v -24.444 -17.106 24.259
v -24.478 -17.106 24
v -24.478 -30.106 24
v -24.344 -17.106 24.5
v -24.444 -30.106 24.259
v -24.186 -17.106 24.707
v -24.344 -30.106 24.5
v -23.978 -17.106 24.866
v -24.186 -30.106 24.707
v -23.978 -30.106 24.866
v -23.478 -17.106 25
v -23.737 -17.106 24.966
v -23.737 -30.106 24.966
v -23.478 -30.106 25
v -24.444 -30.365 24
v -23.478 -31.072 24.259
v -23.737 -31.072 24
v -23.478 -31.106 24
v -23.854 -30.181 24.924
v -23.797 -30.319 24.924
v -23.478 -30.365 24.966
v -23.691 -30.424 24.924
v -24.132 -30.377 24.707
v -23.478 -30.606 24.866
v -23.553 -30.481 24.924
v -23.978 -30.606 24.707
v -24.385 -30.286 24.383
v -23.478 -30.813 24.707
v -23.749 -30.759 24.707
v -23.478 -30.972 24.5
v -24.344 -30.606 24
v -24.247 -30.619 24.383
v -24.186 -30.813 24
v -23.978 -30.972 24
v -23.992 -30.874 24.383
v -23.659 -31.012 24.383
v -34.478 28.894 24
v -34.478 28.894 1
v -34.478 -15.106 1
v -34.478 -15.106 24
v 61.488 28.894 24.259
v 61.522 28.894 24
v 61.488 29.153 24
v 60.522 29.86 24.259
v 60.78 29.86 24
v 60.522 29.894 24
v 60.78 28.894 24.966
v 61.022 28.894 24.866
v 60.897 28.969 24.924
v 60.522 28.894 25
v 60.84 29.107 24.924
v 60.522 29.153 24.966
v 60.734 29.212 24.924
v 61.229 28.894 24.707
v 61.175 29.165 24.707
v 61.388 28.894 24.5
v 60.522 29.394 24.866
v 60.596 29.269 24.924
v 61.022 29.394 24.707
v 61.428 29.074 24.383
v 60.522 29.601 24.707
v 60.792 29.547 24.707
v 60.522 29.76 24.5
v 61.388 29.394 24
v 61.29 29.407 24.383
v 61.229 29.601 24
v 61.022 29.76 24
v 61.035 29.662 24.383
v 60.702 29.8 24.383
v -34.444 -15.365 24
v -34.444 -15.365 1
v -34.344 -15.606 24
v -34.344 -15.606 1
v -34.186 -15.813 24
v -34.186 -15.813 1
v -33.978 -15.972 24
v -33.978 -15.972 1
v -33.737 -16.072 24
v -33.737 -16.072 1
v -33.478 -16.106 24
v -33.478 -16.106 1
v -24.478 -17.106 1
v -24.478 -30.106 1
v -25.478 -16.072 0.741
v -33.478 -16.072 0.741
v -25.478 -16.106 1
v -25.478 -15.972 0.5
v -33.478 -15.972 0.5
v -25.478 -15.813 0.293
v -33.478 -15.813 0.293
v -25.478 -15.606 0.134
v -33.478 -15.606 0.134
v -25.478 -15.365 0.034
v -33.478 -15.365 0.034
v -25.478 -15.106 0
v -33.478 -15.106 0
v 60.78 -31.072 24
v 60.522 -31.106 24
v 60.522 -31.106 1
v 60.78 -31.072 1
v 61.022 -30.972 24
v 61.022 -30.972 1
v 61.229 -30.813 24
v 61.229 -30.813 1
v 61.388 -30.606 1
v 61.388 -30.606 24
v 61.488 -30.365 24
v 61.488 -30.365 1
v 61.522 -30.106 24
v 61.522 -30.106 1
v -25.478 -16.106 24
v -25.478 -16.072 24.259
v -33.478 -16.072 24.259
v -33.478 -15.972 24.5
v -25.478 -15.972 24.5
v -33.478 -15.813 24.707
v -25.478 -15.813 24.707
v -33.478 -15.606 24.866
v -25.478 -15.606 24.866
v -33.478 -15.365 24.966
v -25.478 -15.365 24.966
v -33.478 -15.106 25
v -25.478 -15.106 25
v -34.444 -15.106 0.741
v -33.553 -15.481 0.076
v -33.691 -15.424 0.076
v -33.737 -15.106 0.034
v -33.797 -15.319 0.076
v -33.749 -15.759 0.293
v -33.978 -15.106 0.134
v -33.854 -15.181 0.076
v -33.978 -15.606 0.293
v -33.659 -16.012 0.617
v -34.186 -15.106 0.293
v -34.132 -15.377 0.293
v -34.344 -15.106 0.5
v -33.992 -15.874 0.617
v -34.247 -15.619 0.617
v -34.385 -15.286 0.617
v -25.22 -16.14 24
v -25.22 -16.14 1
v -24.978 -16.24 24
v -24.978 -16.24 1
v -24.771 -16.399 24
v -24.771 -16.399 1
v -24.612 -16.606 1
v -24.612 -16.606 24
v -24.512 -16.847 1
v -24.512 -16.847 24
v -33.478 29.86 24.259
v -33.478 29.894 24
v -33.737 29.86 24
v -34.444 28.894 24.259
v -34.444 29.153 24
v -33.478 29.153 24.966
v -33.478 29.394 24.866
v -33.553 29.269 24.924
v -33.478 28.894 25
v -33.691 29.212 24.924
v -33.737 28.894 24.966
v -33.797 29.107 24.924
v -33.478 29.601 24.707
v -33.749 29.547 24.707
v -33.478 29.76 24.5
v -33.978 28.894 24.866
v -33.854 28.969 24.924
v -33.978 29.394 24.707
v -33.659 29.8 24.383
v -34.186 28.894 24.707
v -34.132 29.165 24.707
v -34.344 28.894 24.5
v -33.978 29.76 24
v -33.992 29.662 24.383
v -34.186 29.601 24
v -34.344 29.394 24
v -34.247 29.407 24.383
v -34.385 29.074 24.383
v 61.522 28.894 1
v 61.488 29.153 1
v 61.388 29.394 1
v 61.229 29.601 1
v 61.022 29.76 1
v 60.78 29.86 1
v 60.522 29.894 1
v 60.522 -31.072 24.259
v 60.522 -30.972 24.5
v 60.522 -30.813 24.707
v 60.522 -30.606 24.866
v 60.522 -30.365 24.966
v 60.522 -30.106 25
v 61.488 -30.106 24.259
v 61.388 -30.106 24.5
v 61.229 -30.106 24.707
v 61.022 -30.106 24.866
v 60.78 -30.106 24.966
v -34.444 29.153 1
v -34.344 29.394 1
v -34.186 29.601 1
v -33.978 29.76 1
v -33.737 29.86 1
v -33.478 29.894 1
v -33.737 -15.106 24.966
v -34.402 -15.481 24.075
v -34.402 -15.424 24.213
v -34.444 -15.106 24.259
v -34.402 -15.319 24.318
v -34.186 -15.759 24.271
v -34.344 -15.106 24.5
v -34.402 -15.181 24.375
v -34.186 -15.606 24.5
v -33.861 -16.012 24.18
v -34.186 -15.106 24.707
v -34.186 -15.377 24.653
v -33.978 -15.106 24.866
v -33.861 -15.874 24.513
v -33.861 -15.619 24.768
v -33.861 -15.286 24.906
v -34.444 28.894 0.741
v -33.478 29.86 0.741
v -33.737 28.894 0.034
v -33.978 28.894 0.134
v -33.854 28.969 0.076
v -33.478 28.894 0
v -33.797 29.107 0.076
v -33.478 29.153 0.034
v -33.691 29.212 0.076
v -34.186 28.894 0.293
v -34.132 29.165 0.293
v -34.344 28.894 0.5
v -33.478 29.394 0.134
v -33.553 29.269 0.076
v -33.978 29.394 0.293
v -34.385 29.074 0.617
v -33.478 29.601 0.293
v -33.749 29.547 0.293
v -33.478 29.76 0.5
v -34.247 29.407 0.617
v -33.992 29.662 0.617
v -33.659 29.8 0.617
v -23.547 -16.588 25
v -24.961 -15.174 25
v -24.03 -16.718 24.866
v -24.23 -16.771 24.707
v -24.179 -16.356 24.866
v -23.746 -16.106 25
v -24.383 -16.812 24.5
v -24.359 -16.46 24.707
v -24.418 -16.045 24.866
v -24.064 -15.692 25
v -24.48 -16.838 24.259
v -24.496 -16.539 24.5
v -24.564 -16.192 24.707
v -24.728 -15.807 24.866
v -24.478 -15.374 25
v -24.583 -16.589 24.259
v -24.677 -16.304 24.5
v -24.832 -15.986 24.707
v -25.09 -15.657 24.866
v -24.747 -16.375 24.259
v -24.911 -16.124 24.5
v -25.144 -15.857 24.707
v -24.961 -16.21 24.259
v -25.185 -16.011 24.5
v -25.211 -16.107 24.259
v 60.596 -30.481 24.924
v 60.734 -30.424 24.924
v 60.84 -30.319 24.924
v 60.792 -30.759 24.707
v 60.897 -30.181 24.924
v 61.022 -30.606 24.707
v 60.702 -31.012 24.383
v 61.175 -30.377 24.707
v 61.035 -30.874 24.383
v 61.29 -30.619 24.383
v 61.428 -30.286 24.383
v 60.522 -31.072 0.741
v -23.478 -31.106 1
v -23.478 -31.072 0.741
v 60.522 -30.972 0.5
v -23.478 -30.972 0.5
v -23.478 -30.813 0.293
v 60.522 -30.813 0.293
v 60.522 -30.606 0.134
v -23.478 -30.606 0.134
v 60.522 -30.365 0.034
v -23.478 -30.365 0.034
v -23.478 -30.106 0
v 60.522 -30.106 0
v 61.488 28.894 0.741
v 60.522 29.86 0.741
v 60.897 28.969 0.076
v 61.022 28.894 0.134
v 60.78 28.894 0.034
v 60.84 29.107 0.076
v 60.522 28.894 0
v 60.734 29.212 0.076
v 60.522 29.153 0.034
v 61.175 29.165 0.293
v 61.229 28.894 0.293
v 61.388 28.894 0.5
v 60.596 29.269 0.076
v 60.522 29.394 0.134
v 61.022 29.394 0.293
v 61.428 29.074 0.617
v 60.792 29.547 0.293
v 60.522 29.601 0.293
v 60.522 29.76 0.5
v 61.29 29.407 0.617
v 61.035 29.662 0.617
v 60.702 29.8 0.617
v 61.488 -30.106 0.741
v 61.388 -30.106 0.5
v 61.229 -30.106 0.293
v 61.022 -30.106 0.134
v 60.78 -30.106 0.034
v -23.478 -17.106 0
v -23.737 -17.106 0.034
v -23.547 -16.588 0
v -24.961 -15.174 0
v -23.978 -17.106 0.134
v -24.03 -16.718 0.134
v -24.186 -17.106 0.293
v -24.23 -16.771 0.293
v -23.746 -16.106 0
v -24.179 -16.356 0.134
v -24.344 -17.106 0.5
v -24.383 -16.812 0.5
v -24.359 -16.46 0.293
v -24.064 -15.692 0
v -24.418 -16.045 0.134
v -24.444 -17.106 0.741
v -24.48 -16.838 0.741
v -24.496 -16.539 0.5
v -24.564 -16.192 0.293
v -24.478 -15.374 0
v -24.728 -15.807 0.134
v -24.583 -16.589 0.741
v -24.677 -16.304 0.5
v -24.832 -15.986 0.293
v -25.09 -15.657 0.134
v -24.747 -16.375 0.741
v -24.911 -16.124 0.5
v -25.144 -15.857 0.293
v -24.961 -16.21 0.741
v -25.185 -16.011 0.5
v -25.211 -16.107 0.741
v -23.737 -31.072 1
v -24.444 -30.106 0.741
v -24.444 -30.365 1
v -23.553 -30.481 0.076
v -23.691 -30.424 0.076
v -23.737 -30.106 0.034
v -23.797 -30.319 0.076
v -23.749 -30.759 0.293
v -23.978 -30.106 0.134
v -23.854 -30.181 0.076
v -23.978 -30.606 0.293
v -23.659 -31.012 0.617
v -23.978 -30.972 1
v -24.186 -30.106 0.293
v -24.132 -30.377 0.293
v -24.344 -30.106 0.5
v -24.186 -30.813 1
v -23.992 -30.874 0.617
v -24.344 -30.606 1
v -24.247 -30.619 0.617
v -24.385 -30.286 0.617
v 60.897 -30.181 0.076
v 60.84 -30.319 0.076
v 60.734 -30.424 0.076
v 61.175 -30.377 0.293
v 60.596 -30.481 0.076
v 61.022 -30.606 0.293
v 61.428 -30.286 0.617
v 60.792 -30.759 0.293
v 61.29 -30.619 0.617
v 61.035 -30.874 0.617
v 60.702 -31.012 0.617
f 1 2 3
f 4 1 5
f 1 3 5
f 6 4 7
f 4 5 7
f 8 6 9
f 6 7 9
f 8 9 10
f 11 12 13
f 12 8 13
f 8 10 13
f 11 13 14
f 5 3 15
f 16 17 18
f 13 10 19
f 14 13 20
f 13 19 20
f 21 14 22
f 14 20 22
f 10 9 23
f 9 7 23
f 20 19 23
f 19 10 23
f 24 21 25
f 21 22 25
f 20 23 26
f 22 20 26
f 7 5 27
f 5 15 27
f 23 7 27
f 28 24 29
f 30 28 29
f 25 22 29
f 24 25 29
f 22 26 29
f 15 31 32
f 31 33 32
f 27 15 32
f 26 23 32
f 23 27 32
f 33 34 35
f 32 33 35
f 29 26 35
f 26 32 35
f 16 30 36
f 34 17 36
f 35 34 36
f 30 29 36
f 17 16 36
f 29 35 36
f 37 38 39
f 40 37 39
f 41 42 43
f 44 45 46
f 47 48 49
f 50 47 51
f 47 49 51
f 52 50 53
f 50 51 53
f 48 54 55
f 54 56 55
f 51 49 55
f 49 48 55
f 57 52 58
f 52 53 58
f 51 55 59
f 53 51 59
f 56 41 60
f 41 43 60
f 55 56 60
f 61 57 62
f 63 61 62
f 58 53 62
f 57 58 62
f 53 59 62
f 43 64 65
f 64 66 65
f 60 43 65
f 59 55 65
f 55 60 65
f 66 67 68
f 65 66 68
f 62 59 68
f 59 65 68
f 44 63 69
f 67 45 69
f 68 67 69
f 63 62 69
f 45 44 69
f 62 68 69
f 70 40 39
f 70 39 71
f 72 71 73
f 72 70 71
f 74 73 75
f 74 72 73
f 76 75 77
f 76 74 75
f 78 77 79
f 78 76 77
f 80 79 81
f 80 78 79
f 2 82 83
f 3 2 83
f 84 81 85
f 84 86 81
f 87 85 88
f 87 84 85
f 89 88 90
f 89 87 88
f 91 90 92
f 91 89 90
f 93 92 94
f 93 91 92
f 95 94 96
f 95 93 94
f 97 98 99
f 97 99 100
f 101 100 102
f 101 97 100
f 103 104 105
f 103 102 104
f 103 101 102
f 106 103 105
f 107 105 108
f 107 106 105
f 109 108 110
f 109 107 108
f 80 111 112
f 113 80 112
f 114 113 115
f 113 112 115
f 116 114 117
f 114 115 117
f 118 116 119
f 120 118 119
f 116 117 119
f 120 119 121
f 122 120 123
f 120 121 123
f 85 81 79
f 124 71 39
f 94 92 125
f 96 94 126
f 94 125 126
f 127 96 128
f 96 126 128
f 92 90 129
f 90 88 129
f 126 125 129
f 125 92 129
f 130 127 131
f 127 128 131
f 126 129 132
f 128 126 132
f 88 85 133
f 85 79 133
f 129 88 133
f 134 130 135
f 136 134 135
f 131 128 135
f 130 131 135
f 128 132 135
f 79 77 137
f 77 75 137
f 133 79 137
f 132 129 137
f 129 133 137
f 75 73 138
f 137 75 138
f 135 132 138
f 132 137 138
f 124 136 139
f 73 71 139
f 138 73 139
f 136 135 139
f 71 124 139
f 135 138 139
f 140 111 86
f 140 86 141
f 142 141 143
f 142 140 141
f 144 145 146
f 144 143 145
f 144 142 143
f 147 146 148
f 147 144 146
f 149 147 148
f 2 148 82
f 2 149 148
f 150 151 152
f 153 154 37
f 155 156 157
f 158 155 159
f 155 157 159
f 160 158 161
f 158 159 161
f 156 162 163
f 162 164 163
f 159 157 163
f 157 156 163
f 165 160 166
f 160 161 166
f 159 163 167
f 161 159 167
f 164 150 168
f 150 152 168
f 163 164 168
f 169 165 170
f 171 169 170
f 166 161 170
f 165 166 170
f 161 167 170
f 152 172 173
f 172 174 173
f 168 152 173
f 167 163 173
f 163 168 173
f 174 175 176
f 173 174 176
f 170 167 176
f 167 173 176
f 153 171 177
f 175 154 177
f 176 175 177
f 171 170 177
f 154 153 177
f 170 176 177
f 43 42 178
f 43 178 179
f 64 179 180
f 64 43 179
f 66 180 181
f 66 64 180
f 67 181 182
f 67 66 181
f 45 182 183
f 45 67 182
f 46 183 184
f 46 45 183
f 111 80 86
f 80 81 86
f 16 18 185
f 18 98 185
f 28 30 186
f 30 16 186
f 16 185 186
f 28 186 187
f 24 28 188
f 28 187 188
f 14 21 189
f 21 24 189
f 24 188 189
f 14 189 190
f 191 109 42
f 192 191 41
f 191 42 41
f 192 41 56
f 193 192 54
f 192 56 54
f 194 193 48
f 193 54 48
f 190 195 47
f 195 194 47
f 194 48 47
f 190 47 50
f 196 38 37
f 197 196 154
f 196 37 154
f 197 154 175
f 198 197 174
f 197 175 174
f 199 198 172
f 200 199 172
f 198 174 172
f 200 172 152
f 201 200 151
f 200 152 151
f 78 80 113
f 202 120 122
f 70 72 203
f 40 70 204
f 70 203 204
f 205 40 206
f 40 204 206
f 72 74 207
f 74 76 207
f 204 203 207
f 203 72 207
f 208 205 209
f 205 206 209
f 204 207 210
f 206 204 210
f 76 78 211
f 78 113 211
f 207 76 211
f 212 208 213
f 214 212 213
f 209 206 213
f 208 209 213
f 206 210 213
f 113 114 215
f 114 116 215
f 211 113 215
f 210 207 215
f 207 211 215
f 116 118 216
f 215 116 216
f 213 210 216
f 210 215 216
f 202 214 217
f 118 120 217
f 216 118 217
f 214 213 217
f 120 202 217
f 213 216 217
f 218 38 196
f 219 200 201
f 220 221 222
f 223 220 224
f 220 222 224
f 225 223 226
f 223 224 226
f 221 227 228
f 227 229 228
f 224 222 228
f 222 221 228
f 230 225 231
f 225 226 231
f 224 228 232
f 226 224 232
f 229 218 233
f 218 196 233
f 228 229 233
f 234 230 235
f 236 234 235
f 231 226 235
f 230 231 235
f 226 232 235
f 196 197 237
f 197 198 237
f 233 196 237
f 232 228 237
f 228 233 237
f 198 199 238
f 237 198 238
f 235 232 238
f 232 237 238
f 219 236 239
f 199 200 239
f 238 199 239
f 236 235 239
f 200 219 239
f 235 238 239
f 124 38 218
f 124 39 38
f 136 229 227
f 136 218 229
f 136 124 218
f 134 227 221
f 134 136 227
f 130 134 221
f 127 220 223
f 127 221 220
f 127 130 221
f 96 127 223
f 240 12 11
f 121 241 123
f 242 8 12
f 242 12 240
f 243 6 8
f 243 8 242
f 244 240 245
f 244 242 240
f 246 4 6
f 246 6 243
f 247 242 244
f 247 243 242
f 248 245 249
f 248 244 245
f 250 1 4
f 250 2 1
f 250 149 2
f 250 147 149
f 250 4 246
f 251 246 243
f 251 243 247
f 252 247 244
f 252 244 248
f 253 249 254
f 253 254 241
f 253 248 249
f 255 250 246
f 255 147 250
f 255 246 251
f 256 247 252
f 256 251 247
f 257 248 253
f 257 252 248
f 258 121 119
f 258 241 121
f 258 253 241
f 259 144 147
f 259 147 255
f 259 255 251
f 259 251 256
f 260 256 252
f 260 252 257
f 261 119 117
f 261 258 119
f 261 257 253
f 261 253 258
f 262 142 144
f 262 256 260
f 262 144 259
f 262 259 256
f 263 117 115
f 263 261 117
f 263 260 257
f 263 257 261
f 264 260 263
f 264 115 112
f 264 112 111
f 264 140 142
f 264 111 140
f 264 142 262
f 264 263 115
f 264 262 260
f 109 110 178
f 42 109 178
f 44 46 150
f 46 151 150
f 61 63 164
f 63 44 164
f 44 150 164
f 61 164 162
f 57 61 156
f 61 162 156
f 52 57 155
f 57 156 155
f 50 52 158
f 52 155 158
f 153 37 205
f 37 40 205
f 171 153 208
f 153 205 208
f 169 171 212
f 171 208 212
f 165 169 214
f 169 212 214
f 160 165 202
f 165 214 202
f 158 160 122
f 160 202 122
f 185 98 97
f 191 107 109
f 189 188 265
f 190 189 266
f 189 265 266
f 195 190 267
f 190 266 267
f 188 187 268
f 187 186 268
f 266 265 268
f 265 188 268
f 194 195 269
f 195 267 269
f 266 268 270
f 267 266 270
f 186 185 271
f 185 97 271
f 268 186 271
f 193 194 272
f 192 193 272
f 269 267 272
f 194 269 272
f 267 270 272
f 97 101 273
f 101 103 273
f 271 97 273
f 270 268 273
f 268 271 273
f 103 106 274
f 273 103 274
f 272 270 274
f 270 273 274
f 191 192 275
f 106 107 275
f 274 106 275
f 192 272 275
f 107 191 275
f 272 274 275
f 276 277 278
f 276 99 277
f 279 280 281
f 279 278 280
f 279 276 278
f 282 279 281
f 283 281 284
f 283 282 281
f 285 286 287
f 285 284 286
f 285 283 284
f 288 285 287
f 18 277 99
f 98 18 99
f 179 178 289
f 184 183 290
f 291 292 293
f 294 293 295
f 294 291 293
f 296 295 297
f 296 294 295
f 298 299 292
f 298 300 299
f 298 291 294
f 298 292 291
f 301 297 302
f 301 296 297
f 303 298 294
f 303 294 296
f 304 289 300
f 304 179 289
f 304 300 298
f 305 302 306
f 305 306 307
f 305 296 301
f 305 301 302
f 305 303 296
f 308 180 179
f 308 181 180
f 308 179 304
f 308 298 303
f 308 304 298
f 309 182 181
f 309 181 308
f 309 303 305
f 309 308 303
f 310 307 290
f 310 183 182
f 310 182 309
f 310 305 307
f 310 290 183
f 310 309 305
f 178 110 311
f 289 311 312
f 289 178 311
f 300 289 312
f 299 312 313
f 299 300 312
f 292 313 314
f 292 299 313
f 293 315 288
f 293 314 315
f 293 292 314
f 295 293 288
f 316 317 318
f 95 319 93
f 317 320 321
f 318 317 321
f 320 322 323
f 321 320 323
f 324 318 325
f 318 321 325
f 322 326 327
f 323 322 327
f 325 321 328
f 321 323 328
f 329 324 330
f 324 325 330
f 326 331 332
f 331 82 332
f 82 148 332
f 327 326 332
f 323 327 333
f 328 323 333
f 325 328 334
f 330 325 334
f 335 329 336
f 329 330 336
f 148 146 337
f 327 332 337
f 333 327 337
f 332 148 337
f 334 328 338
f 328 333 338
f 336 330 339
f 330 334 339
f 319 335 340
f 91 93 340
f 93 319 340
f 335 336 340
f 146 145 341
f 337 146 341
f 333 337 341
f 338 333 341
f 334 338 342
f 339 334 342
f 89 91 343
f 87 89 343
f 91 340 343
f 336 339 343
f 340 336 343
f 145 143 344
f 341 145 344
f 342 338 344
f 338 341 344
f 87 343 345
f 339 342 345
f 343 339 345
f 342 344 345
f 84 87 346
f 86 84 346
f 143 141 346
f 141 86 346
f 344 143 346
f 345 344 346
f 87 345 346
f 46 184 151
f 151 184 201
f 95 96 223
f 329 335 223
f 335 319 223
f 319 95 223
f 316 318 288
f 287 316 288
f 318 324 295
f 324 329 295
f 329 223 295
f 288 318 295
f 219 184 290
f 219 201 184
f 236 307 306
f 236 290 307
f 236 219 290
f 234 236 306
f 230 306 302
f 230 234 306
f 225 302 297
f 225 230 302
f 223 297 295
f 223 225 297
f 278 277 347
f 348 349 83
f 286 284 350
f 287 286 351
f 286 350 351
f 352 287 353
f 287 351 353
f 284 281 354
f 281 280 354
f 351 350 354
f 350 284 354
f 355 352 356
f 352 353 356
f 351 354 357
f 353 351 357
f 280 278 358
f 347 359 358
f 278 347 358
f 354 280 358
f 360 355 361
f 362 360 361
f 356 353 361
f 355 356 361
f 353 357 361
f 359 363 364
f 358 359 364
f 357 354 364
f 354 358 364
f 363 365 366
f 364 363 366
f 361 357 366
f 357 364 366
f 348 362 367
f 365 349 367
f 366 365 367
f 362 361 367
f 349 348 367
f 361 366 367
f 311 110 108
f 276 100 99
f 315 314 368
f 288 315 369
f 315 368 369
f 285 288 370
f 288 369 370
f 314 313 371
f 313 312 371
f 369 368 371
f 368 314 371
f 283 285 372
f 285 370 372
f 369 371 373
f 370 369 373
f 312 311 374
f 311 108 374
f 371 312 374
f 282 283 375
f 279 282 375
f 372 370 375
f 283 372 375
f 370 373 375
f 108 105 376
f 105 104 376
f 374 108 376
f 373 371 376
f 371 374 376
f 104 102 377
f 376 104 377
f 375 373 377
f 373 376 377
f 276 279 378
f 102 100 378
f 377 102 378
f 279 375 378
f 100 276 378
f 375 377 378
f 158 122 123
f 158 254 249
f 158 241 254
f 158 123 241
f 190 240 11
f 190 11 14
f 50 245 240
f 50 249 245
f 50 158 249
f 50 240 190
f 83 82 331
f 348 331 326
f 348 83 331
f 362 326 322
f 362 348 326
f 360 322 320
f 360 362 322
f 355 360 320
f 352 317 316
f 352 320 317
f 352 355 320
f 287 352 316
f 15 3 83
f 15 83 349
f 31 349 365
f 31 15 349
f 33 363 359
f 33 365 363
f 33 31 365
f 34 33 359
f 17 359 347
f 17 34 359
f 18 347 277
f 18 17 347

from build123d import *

# Parameters (mm, degrees)
DODANIE_WYCI_GNI_CIE1_DEPTH = 25
ZAOKR_GLENIE3_R             = 1


with BuildPart() as part:
    # Szkic1 → Dodanie-wyciągnięcie1 (new body)
    with BuildSketch(Plane.XY):
        Polygon((-34.478406184, 29.894019729), (-34.478406184, -16.105980271), (-24.478406184, -16.105980271), (-24.478406184, -31.105980271), (61.521593816, -31.105980271), (61.521593816, 29.894019729), align=None)
    extrude(amount=DODANIE_WYCI_GNI_CIE1_DEPTH)

    # Zaokrąglenie3
    zaokr_glenie3_edges = [part.edges().sort_by_distance(p)[0] for p in [
        (-29.478406184, -16.105980271, 25),
        (61.521593816, 29.894019729, 12.5),
        (61.521593816, -31.105980271, 12.5),
        (-24.478406184, -31.105980271, 12.5),
        (-24.478406184, -16.105980271, 12.5),
        (-34.478406184, -16.105980271, 12.5),
        (-34.478406184, 29.894019729, 12.5),
        (-24.478406184, -23.605980271, 25),
        (18.521593816, -31.105980271, 25),
        (61.521593816, -0.605980271, 25),
        (13.521593816, 29.894019729, 25),
        (61.521593816, -0.605980271, 0),
        (18.521593816, -31.105980271, 0),
        (-24.478406184, -23.605980271, 0),
        (-34.478406184, 6.894019729, 25),
        (-29.478406184, -16.105980271, 0),
        (-34.478406184, 6.894019729, 0),
        (13.521593816, 29.894019729, 0),
    ]]
    fillet(zaokr_glenie3_edges, radius=ZAOKR_GLENIE3_R)


solid = part.part
